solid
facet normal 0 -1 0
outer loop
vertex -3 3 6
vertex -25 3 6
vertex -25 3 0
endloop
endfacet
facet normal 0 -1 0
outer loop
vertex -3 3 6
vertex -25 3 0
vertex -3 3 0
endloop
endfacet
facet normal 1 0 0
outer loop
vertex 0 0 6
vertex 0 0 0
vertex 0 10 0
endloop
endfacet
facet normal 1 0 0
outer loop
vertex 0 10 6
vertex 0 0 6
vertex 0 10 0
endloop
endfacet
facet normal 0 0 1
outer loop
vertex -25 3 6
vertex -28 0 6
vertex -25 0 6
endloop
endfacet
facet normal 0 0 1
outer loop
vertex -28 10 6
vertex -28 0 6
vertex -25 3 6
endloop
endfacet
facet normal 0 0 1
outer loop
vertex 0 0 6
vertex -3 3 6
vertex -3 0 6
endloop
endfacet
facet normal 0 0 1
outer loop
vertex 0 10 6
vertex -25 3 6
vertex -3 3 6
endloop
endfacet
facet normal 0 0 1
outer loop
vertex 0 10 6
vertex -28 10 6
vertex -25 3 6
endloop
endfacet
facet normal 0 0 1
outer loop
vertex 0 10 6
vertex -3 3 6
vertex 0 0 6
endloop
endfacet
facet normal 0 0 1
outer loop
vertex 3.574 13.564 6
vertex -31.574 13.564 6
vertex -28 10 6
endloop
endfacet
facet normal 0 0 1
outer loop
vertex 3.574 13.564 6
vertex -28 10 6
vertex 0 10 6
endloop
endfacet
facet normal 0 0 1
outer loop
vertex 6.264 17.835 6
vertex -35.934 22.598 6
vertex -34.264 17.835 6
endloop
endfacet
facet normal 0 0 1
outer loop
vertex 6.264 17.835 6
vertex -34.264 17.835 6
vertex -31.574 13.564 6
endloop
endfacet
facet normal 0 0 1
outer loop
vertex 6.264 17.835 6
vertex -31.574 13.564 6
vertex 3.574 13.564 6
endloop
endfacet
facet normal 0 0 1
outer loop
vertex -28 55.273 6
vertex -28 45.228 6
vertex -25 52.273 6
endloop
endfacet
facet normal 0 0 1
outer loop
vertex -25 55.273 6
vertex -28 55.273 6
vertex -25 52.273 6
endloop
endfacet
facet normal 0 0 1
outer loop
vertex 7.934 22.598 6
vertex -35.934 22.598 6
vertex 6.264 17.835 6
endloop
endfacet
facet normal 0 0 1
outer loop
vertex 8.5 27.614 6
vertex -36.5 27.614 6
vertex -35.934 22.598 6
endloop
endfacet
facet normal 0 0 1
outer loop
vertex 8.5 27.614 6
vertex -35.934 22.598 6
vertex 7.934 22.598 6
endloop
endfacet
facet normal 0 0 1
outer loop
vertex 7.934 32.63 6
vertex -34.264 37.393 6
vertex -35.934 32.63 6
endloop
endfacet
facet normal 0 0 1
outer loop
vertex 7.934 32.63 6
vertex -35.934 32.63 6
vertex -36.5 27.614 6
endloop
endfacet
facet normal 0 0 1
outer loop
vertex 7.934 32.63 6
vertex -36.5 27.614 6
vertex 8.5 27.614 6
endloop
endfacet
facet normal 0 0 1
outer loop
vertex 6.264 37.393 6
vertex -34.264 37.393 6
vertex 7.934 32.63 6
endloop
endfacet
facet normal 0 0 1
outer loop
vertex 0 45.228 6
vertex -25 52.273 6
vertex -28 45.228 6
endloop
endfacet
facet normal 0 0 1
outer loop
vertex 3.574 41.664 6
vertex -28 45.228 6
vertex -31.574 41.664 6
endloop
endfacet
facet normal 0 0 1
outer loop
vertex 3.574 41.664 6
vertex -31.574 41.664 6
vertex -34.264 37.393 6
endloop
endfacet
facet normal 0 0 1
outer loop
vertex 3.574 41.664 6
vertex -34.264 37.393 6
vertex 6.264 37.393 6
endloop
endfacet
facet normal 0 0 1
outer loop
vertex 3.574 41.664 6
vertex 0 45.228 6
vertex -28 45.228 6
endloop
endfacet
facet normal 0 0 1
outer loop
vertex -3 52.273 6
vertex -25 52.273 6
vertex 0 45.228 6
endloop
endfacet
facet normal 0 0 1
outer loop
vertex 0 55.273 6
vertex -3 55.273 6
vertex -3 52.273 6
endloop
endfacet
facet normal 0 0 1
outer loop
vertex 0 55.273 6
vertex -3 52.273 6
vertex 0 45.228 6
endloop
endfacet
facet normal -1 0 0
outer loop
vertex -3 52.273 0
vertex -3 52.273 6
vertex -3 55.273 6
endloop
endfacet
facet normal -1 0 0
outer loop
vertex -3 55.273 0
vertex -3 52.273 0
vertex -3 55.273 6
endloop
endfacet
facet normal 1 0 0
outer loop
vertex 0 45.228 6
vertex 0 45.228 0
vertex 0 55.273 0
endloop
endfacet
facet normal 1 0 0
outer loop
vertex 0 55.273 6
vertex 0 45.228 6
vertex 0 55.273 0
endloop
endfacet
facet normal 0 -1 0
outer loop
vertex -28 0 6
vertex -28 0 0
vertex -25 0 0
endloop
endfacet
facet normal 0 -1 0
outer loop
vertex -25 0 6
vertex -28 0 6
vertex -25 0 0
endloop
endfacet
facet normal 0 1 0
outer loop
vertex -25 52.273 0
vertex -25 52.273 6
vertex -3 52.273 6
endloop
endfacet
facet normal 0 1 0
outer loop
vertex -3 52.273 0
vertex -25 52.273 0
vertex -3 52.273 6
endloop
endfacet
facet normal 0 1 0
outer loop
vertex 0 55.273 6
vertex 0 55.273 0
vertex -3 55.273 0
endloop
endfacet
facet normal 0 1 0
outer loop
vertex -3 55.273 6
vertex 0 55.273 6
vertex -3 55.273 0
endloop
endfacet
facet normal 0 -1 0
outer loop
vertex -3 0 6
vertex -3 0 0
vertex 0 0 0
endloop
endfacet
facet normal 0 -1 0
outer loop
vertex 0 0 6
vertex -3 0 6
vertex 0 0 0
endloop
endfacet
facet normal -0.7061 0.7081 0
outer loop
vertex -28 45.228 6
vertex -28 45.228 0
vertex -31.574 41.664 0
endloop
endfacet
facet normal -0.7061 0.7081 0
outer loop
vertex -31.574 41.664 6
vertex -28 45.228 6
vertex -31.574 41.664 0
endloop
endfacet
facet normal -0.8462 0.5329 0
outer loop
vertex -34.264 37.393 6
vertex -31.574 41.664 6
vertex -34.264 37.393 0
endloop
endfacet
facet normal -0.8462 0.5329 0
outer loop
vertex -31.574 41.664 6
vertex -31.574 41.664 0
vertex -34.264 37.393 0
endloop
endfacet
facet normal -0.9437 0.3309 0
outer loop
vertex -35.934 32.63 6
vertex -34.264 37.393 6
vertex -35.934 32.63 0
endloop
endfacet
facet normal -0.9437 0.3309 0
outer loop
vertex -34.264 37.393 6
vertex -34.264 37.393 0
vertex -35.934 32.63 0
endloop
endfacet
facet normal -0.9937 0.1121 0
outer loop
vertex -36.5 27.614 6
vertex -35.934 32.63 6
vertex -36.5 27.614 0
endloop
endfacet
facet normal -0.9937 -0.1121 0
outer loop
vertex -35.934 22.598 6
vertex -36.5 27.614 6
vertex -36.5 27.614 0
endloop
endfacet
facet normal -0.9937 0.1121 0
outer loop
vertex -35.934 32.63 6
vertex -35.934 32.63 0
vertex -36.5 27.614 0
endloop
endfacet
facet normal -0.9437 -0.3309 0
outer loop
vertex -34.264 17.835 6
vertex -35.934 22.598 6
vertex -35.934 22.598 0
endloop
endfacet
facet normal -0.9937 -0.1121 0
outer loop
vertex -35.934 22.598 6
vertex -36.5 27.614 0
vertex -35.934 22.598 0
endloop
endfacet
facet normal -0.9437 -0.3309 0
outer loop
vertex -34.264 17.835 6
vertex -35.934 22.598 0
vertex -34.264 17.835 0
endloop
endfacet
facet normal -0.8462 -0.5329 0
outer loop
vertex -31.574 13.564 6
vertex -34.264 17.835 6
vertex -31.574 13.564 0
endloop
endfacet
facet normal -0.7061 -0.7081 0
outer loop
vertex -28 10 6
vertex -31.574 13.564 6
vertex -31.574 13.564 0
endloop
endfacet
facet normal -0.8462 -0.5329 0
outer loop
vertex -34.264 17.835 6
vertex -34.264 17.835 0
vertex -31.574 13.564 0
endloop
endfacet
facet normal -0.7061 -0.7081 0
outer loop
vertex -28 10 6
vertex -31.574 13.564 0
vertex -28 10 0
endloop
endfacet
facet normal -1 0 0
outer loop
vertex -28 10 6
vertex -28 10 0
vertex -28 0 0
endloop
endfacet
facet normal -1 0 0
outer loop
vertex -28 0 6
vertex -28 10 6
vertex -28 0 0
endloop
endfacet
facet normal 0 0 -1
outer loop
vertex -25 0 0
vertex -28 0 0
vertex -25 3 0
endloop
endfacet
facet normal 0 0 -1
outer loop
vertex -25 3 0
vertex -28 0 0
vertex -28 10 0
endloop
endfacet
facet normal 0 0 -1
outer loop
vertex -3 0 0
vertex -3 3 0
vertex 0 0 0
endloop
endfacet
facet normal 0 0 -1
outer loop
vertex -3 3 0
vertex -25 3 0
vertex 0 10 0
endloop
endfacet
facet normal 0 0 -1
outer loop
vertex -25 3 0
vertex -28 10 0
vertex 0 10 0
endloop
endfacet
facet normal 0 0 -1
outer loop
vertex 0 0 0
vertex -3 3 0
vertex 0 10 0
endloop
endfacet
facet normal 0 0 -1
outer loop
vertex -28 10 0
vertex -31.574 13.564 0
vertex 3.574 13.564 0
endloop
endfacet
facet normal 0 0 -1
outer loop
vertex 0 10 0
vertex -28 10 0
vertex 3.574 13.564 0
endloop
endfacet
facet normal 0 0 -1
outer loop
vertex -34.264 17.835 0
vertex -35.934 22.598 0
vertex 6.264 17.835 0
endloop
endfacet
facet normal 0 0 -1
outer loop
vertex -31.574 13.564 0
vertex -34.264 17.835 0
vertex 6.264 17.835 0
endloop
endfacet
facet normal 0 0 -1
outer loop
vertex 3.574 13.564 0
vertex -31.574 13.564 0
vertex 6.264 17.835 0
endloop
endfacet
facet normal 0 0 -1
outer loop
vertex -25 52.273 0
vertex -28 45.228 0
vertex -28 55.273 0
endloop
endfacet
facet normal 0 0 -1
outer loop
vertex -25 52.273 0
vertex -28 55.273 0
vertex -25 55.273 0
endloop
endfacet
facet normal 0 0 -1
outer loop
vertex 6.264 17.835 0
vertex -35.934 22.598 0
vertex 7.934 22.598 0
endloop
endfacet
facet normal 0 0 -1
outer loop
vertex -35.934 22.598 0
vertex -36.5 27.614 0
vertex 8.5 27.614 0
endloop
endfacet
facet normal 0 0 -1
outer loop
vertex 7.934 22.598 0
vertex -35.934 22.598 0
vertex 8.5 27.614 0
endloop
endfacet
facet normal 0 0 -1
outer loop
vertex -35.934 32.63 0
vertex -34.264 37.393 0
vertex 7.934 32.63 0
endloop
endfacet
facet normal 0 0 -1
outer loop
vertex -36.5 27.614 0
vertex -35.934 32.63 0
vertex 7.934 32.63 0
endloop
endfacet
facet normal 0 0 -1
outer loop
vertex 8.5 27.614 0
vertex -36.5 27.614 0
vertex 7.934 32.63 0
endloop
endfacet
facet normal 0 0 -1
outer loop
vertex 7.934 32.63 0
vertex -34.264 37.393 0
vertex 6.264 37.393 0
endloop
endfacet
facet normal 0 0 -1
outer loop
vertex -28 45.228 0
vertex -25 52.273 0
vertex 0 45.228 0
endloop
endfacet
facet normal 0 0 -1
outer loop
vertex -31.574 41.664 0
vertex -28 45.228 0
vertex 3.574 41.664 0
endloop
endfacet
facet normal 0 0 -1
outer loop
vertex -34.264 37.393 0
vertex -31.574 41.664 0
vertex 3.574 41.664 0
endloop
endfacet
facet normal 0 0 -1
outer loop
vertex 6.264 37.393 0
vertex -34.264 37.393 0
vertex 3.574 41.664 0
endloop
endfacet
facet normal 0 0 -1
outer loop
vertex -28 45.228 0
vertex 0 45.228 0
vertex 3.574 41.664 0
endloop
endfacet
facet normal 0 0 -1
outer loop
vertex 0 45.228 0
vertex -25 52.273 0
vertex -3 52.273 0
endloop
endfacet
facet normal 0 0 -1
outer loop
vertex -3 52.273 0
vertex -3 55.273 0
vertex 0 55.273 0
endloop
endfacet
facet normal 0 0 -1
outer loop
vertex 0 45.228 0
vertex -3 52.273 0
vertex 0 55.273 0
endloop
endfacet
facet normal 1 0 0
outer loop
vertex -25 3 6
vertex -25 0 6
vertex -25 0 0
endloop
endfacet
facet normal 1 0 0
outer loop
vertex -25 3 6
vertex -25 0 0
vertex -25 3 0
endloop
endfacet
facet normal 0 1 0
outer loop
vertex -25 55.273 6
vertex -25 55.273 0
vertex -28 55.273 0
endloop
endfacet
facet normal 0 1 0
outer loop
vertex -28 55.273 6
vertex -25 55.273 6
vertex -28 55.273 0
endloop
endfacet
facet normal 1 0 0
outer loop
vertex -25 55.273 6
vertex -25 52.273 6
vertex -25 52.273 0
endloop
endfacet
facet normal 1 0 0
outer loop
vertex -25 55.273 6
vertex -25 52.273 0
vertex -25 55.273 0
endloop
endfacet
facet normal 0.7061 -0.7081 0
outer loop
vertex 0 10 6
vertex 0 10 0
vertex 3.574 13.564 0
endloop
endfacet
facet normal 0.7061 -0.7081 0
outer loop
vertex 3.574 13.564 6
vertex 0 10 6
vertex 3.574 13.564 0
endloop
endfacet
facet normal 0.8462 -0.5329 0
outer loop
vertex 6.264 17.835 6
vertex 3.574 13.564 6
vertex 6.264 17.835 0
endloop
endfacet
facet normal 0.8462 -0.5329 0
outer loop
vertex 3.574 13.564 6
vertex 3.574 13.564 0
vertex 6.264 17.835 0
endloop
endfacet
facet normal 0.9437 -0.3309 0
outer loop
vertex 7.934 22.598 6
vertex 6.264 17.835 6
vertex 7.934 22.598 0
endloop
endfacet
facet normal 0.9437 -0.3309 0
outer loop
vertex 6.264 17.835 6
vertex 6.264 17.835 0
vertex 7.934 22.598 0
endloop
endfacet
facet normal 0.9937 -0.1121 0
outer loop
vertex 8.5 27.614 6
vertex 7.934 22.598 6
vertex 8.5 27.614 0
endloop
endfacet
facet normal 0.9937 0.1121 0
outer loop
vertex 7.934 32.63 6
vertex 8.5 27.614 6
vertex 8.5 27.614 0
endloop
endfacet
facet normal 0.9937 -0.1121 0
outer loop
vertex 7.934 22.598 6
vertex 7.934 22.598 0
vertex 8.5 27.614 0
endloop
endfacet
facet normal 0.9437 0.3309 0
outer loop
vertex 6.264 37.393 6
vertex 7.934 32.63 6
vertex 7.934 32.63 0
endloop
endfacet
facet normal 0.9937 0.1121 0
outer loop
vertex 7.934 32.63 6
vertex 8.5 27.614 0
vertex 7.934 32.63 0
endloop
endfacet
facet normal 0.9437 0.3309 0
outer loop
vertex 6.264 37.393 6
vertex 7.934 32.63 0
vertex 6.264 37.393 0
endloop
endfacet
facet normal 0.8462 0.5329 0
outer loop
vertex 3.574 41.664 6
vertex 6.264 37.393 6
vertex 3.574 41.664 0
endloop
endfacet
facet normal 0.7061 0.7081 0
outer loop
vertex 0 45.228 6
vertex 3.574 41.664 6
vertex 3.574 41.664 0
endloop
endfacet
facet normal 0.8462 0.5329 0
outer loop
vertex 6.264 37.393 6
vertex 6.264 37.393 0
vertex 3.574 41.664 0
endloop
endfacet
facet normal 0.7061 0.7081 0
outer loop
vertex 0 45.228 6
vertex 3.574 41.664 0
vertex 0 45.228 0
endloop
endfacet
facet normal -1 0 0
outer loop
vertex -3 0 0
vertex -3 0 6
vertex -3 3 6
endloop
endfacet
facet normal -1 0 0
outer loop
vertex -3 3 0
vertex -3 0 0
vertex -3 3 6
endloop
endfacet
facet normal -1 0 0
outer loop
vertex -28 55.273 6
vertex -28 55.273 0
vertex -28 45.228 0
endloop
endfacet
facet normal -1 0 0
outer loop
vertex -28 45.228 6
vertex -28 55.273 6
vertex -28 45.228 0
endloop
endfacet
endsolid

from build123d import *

# Parameters (mm, degrees)
F1_DEPTH = 6
F2_W     = 22
F2_H     = 3
F3_DEPTH = 6


with BuildPart() as f1:
    # F0 (on Top) → F1 (new body)
    with BuildSketch(Plane.XY):
        with BuildLine():
            Line((-28, 0), (0, 0))
            Line((0, 0), (0, 10))
            ThreePointArc((0, 10), (8.5, 27.613915), (0, 45.22783))
            Line((0, 45.22783), (0, 55.272548))
            Line((0, 55.272548), (-28, 55.272548))
            Line((-28, 55.272548), (-28, 45.22783))
            ThreePointArc((-28, 45.22783), (-36.5, 27.613915), (-28, 10))
            Line((-28, 10), (-28, 0))
        make_face()
    extrude(amount=F1_DEPTH)

    # F2 (on face) → F3 (cut, through all)
    with BuildSketch(Plane.XY.offset(6)):
        with Locations((-14, 53.772548)):
            Rectangle(F2_W, F2_H)
        with Locations((-14, 1.5)):
            Rectangle(F2_W, F2_H)
    extrude(amount=-F3_DEPTH, mode=Mode.SUBTRACT)


solid = f1.part
